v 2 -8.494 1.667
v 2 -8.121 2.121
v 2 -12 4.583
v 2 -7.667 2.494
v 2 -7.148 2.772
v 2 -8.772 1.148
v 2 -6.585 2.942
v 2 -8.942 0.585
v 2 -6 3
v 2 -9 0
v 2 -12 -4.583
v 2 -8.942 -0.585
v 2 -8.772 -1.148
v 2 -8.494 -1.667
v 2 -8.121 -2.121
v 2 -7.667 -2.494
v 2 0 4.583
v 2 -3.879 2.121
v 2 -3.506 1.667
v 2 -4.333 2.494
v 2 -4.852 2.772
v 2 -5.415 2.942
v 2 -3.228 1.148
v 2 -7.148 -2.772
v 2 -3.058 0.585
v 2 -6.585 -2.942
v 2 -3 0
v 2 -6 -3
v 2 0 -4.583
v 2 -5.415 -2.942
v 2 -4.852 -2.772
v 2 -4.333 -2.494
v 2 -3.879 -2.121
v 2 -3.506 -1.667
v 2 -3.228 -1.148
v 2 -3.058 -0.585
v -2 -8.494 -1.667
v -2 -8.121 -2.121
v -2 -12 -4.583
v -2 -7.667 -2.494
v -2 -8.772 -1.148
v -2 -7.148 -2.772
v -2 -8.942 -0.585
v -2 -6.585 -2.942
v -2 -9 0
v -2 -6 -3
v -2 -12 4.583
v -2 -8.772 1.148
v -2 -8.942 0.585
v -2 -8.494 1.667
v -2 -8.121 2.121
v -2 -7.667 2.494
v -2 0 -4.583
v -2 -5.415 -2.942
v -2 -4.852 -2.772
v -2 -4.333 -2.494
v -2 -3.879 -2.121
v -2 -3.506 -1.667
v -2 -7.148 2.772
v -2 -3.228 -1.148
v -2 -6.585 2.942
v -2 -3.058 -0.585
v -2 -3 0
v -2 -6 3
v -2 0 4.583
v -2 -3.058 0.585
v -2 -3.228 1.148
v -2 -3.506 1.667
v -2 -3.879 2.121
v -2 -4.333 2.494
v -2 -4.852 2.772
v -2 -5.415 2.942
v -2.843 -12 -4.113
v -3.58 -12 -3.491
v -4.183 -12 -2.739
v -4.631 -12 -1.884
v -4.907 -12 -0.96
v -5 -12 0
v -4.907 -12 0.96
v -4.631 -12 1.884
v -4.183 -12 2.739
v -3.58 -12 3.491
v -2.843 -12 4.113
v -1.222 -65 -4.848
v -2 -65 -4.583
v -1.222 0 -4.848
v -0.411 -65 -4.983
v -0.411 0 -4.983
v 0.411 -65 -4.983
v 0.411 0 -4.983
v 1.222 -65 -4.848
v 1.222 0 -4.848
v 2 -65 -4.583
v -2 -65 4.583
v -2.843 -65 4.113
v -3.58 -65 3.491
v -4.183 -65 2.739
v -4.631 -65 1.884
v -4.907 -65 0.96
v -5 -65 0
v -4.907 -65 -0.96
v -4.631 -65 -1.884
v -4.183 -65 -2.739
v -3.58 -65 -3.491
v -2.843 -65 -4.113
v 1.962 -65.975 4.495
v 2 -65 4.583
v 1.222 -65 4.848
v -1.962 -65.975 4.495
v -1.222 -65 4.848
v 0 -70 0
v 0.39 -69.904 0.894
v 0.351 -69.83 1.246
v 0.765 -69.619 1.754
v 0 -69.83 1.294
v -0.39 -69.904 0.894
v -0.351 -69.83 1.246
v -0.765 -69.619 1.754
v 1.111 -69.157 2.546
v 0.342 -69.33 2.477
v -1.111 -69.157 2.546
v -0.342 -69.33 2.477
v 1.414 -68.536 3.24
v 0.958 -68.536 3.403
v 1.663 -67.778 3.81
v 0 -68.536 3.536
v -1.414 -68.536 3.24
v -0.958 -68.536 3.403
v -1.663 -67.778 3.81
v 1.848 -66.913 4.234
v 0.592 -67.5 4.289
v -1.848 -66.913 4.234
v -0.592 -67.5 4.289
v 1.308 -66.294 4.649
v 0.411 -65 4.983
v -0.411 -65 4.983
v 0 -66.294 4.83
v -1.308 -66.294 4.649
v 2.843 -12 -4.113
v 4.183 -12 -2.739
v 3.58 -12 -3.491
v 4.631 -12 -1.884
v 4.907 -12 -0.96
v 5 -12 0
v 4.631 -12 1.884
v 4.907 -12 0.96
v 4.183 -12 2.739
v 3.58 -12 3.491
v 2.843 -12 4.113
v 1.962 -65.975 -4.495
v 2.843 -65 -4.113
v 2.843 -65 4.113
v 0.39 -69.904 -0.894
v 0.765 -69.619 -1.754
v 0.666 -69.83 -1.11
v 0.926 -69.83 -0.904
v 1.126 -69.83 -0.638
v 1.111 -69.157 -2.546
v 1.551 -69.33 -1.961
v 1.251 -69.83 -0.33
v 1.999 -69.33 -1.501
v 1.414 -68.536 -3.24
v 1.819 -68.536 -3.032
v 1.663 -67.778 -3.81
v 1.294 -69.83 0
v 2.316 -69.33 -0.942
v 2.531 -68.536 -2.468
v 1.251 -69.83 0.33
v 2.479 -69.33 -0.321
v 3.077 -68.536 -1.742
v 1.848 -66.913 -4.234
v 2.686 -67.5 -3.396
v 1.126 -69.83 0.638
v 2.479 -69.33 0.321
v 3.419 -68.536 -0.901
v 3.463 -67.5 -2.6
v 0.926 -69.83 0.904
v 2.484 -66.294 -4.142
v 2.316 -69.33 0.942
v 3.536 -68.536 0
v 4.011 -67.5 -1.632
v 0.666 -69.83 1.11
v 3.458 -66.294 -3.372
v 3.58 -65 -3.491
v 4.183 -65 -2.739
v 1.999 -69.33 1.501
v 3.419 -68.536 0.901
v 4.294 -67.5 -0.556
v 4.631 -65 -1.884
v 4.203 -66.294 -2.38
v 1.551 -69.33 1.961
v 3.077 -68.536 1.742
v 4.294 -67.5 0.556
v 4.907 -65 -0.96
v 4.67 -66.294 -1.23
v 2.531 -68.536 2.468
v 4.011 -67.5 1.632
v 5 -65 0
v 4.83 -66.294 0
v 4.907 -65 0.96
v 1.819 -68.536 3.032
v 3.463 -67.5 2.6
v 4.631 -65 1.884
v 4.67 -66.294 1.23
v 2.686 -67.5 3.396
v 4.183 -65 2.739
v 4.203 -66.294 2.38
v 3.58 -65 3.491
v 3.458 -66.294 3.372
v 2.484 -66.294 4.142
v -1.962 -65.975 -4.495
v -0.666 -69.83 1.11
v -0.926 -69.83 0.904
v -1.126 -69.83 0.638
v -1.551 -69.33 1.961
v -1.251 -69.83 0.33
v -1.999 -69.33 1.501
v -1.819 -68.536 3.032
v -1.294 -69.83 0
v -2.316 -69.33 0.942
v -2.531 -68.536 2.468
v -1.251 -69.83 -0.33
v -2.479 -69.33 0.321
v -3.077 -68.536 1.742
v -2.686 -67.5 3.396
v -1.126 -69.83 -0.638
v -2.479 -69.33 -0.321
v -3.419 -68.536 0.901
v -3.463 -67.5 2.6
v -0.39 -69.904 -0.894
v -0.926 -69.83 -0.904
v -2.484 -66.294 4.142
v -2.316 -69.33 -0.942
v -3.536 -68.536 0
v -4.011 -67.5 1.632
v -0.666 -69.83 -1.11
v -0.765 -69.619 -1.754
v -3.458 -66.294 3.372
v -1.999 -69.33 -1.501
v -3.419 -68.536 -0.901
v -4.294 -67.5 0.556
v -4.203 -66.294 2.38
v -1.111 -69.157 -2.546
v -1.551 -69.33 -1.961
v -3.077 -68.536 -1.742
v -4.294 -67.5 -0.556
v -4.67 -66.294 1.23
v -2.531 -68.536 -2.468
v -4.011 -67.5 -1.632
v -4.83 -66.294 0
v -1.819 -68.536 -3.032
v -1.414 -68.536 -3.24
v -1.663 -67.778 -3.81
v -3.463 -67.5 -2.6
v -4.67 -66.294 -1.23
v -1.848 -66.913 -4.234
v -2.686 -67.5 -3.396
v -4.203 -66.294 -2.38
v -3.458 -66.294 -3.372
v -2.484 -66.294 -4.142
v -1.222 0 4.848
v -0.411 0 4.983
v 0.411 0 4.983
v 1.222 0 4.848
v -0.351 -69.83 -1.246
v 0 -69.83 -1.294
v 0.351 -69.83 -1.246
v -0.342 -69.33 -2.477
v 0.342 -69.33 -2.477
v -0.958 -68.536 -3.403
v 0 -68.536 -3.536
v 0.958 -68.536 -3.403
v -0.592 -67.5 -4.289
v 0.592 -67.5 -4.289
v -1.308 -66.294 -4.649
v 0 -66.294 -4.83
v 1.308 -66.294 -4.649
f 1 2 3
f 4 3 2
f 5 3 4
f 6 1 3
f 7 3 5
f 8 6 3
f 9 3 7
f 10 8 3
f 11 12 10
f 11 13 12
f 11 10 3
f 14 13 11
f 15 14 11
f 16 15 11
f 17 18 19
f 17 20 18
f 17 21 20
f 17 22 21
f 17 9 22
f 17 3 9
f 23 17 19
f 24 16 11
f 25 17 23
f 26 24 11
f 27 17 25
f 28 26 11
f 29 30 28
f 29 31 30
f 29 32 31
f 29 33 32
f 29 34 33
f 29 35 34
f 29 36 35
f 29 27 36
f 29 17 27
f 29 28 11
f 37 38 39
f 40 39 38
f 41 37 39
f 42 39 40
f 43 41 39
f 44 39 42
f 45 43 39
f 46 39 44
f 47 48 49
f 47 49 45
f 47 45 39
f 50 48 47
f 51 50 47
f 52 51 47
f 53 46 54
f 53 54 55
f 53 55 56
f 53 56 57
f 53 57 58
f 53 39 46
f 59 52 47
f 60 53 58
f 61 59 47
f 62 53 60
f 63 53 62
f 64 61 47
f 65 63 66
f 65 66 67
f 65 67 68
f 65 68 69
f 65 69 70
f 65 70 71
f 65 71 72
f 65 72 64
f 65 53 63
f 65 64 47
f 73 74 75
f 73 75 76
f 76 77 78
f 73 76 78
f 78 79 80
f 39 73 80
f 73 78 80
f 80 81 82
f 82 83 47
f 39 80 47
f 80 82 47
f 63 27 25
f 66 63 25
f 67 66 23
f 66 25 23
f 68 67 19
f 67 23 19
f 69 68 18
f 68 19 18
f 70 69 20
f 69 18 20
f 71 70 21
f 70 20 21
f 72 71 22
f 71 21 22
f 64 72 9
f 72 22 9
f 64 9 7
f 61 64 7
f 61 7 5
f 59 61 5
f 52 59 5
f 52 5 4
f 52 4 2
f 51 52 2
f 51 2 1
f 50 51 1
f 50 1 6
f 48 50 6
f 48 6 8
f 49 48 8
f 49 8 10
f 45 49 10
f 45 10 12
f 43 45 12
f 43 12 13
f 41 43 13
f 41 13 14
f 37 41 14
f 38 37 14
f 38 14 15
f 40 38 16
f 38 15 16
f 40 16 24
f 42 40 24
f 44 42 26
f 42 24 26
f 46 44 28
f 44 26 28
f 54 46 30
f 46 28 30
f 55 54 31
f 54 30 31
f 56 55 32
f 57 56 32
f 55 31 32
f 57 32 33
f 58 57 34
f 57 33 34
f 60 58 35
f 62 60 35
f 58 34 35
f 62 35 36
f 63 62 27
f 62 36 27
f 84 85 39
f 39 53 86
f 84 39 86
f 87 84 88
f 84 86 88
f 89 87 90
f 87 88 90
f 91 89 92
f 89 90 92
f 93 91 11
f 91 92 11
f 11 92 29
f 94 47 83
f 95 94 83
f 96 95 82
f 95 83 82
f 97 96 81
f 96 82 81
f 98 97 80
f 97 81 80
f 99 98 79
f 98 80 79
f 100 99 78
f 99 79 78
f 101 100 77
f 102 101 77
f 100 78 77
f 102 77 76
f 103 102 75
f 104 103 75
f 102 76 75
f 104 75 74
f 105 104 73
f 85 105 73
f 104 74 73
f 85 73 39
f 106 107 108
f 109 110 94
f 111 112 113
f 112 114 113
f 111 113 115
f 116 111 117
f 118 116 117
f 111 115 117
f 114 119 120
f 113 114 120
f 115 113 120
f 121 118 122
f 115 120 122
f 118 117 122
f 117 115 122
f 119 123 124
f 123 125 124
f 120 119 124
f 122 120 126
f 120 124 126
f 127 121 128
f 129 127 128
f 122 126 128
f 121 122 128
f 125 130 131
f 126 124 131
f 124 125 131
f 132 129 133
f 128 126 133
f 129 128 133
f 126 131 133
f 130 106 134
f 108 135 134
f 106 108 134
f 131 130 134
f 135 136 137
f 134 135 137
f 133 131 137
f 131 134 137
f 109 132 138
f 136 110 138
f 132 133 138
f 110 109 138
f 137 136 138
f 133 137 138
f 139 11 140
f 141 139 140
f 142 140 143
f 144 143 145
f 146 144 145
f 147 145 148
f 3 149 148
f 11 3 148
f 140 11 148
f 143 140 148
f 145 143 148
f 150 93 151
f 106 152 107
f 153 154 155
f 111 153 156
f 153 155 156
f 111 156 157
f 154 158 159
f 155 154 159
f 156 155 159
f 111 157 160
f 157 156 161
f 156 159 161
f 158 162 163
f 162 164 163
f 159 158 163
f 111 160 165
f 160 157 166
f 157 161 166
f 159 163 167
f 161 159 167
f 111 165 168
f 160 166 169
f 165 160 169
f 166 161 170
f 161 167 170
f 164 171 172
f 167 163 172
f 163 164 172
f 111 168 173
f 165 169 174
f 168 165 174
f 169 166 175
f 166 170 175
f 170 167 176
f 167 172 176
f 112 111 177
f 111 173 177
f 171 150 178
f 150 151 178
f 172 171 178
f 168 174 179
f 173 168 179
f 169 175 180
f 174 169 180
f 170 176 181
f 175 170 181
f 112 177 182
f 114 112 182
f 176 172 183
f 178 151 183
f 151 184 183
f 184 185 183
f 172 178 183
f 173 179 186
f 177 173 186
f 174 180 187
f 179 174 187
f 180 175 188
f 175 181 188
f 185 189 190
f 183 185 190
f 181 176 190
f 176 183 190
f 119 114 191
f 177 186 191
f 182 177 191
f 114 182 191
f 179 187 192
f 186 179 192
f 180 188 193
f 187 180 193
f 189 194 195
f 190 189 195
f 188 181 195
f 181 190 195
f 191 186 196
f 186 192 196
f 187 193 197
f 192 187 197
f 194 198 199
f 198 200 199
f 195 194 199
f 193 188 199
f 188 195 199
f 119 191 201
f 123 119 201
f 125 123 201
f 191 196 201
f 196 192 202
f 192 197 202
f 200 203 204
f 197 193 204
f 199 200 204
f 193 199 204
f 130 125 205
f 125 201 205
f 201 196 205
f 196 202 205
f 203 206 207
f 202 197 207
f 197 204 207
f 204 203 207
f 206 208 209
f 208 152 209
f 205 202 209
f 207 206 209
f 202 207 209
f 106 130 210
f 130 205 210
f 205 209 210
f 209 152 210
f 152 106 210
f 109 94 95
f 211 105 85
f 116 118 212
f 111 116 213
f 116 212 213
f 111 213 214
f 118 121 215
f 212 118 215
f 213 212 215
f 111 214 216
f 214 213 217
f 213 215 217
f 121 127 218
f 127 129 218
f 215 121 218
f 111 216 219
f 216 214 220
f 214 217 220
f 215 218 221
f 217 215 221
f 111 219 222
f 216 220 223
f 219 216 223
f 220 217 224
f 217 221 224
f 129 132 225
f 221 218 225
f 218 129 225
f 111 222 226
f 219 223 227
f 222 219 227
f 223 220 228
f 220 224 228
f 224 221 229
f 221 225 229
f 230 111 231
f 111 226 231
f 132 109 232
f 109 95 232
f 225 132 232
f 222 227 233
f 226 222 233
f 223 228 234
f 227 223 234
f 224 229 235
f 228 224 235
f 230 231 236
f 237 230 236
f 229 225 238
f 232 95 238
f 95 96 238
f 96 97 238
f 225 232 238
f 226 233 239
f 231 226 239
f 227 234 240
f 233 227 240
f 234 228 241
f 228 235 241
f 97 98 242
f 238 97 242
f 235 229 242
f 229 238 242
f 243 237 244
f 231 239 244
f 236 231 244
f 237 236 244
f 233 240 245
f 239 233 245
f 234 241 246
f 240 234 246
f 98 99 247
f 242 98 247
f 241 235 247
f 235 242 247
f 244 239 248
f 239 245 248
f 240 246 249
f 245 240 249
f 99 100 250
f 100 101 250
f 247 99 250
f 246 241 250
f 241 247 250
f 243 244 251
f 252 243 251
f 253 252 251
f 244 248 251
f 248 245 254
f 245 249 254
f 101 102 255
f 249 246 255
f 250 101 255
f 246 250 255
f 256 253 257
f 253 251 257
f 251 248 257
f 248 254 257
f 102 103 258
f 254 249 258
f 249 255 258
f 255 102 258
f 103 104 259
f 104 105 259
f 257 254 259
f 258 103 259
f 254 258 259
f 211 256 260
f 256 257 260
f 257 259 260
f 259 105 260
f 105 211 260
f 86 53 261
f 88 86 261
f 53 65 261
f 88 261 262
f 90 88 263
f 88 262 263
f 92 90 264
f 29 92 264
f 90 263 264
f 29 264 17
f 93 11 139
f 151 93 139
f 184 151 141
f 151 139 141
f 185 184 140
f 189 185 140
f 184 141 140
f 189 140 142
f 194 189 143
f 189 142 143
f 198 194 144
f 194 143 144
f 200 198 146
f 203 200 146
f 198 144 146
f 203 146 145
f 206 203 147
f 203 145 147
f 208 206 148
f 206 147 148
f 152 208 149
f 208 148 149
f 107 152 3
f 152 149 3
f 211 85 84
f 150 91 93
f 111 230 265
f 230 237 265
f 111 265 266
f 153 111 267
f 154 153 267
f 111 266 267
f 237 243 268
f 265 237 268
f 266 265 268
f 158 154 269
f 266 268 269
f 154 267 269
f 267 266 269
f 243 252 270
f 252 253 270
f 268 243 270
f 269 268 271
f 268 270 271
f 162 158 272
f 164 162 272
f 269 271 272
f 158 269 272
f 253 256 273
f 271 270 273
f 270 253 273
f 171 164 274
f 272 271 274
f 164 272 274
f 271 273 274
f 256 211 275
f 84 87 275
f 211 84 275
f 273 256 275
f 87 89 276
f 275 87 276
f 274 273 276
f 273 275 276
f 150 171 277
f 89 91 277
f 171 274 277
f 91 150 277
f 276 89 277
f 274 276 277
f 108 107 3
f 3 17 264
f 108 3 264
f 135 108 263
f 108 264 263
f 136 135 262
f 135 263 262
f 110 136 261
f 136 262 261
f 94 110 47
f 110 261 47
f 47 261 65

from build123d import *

# Parameters (mm, degrees)
F1_DEPTH = 70
F2_DEPTH = 12
F3_R     = 3
F4_DEPTH = 25
F5_R     = 5


with BuildPart() as f1:
    # F0 (on Front) → F1 (new body)
    with BuildSketch(Plane.XZ):
        with BuildLine():
            ThreePointArc((2, -4.582575695), (4.1833001327, -2.7386127875), (5, 0))
            ThreePointArc((5, 0), (4.1833001327, 2.7386127875), (2, 4.582575695))
            Line((2, 4.582575695), (2, -4.582575695))
        make_face()
        with BuildLine():
            Line((2, -4.582575695), (2, 4.582575695))
            ThreePointArc((2, 4.582575695), (0, 5), (-2, 4.582575695))
            Line((-2, 4.582575695), (-2, -4.582575695))
            ThreePointArc((-2, -4.582575695), (0, -5), (2, -4.582575695))
        make_face()
        with BuildLine():
            Line((-2, -4.582575695), (-2, 4.582575695))
            ThreePointArc((-2, 4.582575695), (-5, 0), (-2, -4.582575695))
        make_face()
    extrude(amount=F1_DEPTH)

    # F0 (on Front) → F2 (cut)
    with BuildSketch(Plane.XZ):
        with BuildLine():
            Line((-2, -4.582575695), (-2, 4.582575695))
            ThreePointArc((-2, 4.582575695), (-5, 0), (-2, -4.582575695))
        make_face()
        with BuildLine():
            ThreePointArc((2, -4.582575695), (4.1833001327, -2.7386127875), (5, 0))
            ThreePointArc((5, 0), (4.1833001327, 2.7386127875), (2, 4.582575695))
            Line((2, 4.582575695), (2, -4.582575695))
        make_face()
    extrude(amount=F2_DEPTH, mode=Mode.SUBTRACT)

    # F3 (on face) → F4 (cut)
    with BuildSketch(Plane.YZ.offset(2)):
        with Locations((-6, 0)):
            Circle(F3_R)
    extrude(amount=-F4_DEPTH, mode=Mode.SUBTRACT)

    # F5
    f5_edges = [f1.edges().sort_by_distance(p)[0] for p in [
        (2, -70, -4.582576),
    ]]
    fillet(f5_edges, radius=F5_R)


solid = f1.part
